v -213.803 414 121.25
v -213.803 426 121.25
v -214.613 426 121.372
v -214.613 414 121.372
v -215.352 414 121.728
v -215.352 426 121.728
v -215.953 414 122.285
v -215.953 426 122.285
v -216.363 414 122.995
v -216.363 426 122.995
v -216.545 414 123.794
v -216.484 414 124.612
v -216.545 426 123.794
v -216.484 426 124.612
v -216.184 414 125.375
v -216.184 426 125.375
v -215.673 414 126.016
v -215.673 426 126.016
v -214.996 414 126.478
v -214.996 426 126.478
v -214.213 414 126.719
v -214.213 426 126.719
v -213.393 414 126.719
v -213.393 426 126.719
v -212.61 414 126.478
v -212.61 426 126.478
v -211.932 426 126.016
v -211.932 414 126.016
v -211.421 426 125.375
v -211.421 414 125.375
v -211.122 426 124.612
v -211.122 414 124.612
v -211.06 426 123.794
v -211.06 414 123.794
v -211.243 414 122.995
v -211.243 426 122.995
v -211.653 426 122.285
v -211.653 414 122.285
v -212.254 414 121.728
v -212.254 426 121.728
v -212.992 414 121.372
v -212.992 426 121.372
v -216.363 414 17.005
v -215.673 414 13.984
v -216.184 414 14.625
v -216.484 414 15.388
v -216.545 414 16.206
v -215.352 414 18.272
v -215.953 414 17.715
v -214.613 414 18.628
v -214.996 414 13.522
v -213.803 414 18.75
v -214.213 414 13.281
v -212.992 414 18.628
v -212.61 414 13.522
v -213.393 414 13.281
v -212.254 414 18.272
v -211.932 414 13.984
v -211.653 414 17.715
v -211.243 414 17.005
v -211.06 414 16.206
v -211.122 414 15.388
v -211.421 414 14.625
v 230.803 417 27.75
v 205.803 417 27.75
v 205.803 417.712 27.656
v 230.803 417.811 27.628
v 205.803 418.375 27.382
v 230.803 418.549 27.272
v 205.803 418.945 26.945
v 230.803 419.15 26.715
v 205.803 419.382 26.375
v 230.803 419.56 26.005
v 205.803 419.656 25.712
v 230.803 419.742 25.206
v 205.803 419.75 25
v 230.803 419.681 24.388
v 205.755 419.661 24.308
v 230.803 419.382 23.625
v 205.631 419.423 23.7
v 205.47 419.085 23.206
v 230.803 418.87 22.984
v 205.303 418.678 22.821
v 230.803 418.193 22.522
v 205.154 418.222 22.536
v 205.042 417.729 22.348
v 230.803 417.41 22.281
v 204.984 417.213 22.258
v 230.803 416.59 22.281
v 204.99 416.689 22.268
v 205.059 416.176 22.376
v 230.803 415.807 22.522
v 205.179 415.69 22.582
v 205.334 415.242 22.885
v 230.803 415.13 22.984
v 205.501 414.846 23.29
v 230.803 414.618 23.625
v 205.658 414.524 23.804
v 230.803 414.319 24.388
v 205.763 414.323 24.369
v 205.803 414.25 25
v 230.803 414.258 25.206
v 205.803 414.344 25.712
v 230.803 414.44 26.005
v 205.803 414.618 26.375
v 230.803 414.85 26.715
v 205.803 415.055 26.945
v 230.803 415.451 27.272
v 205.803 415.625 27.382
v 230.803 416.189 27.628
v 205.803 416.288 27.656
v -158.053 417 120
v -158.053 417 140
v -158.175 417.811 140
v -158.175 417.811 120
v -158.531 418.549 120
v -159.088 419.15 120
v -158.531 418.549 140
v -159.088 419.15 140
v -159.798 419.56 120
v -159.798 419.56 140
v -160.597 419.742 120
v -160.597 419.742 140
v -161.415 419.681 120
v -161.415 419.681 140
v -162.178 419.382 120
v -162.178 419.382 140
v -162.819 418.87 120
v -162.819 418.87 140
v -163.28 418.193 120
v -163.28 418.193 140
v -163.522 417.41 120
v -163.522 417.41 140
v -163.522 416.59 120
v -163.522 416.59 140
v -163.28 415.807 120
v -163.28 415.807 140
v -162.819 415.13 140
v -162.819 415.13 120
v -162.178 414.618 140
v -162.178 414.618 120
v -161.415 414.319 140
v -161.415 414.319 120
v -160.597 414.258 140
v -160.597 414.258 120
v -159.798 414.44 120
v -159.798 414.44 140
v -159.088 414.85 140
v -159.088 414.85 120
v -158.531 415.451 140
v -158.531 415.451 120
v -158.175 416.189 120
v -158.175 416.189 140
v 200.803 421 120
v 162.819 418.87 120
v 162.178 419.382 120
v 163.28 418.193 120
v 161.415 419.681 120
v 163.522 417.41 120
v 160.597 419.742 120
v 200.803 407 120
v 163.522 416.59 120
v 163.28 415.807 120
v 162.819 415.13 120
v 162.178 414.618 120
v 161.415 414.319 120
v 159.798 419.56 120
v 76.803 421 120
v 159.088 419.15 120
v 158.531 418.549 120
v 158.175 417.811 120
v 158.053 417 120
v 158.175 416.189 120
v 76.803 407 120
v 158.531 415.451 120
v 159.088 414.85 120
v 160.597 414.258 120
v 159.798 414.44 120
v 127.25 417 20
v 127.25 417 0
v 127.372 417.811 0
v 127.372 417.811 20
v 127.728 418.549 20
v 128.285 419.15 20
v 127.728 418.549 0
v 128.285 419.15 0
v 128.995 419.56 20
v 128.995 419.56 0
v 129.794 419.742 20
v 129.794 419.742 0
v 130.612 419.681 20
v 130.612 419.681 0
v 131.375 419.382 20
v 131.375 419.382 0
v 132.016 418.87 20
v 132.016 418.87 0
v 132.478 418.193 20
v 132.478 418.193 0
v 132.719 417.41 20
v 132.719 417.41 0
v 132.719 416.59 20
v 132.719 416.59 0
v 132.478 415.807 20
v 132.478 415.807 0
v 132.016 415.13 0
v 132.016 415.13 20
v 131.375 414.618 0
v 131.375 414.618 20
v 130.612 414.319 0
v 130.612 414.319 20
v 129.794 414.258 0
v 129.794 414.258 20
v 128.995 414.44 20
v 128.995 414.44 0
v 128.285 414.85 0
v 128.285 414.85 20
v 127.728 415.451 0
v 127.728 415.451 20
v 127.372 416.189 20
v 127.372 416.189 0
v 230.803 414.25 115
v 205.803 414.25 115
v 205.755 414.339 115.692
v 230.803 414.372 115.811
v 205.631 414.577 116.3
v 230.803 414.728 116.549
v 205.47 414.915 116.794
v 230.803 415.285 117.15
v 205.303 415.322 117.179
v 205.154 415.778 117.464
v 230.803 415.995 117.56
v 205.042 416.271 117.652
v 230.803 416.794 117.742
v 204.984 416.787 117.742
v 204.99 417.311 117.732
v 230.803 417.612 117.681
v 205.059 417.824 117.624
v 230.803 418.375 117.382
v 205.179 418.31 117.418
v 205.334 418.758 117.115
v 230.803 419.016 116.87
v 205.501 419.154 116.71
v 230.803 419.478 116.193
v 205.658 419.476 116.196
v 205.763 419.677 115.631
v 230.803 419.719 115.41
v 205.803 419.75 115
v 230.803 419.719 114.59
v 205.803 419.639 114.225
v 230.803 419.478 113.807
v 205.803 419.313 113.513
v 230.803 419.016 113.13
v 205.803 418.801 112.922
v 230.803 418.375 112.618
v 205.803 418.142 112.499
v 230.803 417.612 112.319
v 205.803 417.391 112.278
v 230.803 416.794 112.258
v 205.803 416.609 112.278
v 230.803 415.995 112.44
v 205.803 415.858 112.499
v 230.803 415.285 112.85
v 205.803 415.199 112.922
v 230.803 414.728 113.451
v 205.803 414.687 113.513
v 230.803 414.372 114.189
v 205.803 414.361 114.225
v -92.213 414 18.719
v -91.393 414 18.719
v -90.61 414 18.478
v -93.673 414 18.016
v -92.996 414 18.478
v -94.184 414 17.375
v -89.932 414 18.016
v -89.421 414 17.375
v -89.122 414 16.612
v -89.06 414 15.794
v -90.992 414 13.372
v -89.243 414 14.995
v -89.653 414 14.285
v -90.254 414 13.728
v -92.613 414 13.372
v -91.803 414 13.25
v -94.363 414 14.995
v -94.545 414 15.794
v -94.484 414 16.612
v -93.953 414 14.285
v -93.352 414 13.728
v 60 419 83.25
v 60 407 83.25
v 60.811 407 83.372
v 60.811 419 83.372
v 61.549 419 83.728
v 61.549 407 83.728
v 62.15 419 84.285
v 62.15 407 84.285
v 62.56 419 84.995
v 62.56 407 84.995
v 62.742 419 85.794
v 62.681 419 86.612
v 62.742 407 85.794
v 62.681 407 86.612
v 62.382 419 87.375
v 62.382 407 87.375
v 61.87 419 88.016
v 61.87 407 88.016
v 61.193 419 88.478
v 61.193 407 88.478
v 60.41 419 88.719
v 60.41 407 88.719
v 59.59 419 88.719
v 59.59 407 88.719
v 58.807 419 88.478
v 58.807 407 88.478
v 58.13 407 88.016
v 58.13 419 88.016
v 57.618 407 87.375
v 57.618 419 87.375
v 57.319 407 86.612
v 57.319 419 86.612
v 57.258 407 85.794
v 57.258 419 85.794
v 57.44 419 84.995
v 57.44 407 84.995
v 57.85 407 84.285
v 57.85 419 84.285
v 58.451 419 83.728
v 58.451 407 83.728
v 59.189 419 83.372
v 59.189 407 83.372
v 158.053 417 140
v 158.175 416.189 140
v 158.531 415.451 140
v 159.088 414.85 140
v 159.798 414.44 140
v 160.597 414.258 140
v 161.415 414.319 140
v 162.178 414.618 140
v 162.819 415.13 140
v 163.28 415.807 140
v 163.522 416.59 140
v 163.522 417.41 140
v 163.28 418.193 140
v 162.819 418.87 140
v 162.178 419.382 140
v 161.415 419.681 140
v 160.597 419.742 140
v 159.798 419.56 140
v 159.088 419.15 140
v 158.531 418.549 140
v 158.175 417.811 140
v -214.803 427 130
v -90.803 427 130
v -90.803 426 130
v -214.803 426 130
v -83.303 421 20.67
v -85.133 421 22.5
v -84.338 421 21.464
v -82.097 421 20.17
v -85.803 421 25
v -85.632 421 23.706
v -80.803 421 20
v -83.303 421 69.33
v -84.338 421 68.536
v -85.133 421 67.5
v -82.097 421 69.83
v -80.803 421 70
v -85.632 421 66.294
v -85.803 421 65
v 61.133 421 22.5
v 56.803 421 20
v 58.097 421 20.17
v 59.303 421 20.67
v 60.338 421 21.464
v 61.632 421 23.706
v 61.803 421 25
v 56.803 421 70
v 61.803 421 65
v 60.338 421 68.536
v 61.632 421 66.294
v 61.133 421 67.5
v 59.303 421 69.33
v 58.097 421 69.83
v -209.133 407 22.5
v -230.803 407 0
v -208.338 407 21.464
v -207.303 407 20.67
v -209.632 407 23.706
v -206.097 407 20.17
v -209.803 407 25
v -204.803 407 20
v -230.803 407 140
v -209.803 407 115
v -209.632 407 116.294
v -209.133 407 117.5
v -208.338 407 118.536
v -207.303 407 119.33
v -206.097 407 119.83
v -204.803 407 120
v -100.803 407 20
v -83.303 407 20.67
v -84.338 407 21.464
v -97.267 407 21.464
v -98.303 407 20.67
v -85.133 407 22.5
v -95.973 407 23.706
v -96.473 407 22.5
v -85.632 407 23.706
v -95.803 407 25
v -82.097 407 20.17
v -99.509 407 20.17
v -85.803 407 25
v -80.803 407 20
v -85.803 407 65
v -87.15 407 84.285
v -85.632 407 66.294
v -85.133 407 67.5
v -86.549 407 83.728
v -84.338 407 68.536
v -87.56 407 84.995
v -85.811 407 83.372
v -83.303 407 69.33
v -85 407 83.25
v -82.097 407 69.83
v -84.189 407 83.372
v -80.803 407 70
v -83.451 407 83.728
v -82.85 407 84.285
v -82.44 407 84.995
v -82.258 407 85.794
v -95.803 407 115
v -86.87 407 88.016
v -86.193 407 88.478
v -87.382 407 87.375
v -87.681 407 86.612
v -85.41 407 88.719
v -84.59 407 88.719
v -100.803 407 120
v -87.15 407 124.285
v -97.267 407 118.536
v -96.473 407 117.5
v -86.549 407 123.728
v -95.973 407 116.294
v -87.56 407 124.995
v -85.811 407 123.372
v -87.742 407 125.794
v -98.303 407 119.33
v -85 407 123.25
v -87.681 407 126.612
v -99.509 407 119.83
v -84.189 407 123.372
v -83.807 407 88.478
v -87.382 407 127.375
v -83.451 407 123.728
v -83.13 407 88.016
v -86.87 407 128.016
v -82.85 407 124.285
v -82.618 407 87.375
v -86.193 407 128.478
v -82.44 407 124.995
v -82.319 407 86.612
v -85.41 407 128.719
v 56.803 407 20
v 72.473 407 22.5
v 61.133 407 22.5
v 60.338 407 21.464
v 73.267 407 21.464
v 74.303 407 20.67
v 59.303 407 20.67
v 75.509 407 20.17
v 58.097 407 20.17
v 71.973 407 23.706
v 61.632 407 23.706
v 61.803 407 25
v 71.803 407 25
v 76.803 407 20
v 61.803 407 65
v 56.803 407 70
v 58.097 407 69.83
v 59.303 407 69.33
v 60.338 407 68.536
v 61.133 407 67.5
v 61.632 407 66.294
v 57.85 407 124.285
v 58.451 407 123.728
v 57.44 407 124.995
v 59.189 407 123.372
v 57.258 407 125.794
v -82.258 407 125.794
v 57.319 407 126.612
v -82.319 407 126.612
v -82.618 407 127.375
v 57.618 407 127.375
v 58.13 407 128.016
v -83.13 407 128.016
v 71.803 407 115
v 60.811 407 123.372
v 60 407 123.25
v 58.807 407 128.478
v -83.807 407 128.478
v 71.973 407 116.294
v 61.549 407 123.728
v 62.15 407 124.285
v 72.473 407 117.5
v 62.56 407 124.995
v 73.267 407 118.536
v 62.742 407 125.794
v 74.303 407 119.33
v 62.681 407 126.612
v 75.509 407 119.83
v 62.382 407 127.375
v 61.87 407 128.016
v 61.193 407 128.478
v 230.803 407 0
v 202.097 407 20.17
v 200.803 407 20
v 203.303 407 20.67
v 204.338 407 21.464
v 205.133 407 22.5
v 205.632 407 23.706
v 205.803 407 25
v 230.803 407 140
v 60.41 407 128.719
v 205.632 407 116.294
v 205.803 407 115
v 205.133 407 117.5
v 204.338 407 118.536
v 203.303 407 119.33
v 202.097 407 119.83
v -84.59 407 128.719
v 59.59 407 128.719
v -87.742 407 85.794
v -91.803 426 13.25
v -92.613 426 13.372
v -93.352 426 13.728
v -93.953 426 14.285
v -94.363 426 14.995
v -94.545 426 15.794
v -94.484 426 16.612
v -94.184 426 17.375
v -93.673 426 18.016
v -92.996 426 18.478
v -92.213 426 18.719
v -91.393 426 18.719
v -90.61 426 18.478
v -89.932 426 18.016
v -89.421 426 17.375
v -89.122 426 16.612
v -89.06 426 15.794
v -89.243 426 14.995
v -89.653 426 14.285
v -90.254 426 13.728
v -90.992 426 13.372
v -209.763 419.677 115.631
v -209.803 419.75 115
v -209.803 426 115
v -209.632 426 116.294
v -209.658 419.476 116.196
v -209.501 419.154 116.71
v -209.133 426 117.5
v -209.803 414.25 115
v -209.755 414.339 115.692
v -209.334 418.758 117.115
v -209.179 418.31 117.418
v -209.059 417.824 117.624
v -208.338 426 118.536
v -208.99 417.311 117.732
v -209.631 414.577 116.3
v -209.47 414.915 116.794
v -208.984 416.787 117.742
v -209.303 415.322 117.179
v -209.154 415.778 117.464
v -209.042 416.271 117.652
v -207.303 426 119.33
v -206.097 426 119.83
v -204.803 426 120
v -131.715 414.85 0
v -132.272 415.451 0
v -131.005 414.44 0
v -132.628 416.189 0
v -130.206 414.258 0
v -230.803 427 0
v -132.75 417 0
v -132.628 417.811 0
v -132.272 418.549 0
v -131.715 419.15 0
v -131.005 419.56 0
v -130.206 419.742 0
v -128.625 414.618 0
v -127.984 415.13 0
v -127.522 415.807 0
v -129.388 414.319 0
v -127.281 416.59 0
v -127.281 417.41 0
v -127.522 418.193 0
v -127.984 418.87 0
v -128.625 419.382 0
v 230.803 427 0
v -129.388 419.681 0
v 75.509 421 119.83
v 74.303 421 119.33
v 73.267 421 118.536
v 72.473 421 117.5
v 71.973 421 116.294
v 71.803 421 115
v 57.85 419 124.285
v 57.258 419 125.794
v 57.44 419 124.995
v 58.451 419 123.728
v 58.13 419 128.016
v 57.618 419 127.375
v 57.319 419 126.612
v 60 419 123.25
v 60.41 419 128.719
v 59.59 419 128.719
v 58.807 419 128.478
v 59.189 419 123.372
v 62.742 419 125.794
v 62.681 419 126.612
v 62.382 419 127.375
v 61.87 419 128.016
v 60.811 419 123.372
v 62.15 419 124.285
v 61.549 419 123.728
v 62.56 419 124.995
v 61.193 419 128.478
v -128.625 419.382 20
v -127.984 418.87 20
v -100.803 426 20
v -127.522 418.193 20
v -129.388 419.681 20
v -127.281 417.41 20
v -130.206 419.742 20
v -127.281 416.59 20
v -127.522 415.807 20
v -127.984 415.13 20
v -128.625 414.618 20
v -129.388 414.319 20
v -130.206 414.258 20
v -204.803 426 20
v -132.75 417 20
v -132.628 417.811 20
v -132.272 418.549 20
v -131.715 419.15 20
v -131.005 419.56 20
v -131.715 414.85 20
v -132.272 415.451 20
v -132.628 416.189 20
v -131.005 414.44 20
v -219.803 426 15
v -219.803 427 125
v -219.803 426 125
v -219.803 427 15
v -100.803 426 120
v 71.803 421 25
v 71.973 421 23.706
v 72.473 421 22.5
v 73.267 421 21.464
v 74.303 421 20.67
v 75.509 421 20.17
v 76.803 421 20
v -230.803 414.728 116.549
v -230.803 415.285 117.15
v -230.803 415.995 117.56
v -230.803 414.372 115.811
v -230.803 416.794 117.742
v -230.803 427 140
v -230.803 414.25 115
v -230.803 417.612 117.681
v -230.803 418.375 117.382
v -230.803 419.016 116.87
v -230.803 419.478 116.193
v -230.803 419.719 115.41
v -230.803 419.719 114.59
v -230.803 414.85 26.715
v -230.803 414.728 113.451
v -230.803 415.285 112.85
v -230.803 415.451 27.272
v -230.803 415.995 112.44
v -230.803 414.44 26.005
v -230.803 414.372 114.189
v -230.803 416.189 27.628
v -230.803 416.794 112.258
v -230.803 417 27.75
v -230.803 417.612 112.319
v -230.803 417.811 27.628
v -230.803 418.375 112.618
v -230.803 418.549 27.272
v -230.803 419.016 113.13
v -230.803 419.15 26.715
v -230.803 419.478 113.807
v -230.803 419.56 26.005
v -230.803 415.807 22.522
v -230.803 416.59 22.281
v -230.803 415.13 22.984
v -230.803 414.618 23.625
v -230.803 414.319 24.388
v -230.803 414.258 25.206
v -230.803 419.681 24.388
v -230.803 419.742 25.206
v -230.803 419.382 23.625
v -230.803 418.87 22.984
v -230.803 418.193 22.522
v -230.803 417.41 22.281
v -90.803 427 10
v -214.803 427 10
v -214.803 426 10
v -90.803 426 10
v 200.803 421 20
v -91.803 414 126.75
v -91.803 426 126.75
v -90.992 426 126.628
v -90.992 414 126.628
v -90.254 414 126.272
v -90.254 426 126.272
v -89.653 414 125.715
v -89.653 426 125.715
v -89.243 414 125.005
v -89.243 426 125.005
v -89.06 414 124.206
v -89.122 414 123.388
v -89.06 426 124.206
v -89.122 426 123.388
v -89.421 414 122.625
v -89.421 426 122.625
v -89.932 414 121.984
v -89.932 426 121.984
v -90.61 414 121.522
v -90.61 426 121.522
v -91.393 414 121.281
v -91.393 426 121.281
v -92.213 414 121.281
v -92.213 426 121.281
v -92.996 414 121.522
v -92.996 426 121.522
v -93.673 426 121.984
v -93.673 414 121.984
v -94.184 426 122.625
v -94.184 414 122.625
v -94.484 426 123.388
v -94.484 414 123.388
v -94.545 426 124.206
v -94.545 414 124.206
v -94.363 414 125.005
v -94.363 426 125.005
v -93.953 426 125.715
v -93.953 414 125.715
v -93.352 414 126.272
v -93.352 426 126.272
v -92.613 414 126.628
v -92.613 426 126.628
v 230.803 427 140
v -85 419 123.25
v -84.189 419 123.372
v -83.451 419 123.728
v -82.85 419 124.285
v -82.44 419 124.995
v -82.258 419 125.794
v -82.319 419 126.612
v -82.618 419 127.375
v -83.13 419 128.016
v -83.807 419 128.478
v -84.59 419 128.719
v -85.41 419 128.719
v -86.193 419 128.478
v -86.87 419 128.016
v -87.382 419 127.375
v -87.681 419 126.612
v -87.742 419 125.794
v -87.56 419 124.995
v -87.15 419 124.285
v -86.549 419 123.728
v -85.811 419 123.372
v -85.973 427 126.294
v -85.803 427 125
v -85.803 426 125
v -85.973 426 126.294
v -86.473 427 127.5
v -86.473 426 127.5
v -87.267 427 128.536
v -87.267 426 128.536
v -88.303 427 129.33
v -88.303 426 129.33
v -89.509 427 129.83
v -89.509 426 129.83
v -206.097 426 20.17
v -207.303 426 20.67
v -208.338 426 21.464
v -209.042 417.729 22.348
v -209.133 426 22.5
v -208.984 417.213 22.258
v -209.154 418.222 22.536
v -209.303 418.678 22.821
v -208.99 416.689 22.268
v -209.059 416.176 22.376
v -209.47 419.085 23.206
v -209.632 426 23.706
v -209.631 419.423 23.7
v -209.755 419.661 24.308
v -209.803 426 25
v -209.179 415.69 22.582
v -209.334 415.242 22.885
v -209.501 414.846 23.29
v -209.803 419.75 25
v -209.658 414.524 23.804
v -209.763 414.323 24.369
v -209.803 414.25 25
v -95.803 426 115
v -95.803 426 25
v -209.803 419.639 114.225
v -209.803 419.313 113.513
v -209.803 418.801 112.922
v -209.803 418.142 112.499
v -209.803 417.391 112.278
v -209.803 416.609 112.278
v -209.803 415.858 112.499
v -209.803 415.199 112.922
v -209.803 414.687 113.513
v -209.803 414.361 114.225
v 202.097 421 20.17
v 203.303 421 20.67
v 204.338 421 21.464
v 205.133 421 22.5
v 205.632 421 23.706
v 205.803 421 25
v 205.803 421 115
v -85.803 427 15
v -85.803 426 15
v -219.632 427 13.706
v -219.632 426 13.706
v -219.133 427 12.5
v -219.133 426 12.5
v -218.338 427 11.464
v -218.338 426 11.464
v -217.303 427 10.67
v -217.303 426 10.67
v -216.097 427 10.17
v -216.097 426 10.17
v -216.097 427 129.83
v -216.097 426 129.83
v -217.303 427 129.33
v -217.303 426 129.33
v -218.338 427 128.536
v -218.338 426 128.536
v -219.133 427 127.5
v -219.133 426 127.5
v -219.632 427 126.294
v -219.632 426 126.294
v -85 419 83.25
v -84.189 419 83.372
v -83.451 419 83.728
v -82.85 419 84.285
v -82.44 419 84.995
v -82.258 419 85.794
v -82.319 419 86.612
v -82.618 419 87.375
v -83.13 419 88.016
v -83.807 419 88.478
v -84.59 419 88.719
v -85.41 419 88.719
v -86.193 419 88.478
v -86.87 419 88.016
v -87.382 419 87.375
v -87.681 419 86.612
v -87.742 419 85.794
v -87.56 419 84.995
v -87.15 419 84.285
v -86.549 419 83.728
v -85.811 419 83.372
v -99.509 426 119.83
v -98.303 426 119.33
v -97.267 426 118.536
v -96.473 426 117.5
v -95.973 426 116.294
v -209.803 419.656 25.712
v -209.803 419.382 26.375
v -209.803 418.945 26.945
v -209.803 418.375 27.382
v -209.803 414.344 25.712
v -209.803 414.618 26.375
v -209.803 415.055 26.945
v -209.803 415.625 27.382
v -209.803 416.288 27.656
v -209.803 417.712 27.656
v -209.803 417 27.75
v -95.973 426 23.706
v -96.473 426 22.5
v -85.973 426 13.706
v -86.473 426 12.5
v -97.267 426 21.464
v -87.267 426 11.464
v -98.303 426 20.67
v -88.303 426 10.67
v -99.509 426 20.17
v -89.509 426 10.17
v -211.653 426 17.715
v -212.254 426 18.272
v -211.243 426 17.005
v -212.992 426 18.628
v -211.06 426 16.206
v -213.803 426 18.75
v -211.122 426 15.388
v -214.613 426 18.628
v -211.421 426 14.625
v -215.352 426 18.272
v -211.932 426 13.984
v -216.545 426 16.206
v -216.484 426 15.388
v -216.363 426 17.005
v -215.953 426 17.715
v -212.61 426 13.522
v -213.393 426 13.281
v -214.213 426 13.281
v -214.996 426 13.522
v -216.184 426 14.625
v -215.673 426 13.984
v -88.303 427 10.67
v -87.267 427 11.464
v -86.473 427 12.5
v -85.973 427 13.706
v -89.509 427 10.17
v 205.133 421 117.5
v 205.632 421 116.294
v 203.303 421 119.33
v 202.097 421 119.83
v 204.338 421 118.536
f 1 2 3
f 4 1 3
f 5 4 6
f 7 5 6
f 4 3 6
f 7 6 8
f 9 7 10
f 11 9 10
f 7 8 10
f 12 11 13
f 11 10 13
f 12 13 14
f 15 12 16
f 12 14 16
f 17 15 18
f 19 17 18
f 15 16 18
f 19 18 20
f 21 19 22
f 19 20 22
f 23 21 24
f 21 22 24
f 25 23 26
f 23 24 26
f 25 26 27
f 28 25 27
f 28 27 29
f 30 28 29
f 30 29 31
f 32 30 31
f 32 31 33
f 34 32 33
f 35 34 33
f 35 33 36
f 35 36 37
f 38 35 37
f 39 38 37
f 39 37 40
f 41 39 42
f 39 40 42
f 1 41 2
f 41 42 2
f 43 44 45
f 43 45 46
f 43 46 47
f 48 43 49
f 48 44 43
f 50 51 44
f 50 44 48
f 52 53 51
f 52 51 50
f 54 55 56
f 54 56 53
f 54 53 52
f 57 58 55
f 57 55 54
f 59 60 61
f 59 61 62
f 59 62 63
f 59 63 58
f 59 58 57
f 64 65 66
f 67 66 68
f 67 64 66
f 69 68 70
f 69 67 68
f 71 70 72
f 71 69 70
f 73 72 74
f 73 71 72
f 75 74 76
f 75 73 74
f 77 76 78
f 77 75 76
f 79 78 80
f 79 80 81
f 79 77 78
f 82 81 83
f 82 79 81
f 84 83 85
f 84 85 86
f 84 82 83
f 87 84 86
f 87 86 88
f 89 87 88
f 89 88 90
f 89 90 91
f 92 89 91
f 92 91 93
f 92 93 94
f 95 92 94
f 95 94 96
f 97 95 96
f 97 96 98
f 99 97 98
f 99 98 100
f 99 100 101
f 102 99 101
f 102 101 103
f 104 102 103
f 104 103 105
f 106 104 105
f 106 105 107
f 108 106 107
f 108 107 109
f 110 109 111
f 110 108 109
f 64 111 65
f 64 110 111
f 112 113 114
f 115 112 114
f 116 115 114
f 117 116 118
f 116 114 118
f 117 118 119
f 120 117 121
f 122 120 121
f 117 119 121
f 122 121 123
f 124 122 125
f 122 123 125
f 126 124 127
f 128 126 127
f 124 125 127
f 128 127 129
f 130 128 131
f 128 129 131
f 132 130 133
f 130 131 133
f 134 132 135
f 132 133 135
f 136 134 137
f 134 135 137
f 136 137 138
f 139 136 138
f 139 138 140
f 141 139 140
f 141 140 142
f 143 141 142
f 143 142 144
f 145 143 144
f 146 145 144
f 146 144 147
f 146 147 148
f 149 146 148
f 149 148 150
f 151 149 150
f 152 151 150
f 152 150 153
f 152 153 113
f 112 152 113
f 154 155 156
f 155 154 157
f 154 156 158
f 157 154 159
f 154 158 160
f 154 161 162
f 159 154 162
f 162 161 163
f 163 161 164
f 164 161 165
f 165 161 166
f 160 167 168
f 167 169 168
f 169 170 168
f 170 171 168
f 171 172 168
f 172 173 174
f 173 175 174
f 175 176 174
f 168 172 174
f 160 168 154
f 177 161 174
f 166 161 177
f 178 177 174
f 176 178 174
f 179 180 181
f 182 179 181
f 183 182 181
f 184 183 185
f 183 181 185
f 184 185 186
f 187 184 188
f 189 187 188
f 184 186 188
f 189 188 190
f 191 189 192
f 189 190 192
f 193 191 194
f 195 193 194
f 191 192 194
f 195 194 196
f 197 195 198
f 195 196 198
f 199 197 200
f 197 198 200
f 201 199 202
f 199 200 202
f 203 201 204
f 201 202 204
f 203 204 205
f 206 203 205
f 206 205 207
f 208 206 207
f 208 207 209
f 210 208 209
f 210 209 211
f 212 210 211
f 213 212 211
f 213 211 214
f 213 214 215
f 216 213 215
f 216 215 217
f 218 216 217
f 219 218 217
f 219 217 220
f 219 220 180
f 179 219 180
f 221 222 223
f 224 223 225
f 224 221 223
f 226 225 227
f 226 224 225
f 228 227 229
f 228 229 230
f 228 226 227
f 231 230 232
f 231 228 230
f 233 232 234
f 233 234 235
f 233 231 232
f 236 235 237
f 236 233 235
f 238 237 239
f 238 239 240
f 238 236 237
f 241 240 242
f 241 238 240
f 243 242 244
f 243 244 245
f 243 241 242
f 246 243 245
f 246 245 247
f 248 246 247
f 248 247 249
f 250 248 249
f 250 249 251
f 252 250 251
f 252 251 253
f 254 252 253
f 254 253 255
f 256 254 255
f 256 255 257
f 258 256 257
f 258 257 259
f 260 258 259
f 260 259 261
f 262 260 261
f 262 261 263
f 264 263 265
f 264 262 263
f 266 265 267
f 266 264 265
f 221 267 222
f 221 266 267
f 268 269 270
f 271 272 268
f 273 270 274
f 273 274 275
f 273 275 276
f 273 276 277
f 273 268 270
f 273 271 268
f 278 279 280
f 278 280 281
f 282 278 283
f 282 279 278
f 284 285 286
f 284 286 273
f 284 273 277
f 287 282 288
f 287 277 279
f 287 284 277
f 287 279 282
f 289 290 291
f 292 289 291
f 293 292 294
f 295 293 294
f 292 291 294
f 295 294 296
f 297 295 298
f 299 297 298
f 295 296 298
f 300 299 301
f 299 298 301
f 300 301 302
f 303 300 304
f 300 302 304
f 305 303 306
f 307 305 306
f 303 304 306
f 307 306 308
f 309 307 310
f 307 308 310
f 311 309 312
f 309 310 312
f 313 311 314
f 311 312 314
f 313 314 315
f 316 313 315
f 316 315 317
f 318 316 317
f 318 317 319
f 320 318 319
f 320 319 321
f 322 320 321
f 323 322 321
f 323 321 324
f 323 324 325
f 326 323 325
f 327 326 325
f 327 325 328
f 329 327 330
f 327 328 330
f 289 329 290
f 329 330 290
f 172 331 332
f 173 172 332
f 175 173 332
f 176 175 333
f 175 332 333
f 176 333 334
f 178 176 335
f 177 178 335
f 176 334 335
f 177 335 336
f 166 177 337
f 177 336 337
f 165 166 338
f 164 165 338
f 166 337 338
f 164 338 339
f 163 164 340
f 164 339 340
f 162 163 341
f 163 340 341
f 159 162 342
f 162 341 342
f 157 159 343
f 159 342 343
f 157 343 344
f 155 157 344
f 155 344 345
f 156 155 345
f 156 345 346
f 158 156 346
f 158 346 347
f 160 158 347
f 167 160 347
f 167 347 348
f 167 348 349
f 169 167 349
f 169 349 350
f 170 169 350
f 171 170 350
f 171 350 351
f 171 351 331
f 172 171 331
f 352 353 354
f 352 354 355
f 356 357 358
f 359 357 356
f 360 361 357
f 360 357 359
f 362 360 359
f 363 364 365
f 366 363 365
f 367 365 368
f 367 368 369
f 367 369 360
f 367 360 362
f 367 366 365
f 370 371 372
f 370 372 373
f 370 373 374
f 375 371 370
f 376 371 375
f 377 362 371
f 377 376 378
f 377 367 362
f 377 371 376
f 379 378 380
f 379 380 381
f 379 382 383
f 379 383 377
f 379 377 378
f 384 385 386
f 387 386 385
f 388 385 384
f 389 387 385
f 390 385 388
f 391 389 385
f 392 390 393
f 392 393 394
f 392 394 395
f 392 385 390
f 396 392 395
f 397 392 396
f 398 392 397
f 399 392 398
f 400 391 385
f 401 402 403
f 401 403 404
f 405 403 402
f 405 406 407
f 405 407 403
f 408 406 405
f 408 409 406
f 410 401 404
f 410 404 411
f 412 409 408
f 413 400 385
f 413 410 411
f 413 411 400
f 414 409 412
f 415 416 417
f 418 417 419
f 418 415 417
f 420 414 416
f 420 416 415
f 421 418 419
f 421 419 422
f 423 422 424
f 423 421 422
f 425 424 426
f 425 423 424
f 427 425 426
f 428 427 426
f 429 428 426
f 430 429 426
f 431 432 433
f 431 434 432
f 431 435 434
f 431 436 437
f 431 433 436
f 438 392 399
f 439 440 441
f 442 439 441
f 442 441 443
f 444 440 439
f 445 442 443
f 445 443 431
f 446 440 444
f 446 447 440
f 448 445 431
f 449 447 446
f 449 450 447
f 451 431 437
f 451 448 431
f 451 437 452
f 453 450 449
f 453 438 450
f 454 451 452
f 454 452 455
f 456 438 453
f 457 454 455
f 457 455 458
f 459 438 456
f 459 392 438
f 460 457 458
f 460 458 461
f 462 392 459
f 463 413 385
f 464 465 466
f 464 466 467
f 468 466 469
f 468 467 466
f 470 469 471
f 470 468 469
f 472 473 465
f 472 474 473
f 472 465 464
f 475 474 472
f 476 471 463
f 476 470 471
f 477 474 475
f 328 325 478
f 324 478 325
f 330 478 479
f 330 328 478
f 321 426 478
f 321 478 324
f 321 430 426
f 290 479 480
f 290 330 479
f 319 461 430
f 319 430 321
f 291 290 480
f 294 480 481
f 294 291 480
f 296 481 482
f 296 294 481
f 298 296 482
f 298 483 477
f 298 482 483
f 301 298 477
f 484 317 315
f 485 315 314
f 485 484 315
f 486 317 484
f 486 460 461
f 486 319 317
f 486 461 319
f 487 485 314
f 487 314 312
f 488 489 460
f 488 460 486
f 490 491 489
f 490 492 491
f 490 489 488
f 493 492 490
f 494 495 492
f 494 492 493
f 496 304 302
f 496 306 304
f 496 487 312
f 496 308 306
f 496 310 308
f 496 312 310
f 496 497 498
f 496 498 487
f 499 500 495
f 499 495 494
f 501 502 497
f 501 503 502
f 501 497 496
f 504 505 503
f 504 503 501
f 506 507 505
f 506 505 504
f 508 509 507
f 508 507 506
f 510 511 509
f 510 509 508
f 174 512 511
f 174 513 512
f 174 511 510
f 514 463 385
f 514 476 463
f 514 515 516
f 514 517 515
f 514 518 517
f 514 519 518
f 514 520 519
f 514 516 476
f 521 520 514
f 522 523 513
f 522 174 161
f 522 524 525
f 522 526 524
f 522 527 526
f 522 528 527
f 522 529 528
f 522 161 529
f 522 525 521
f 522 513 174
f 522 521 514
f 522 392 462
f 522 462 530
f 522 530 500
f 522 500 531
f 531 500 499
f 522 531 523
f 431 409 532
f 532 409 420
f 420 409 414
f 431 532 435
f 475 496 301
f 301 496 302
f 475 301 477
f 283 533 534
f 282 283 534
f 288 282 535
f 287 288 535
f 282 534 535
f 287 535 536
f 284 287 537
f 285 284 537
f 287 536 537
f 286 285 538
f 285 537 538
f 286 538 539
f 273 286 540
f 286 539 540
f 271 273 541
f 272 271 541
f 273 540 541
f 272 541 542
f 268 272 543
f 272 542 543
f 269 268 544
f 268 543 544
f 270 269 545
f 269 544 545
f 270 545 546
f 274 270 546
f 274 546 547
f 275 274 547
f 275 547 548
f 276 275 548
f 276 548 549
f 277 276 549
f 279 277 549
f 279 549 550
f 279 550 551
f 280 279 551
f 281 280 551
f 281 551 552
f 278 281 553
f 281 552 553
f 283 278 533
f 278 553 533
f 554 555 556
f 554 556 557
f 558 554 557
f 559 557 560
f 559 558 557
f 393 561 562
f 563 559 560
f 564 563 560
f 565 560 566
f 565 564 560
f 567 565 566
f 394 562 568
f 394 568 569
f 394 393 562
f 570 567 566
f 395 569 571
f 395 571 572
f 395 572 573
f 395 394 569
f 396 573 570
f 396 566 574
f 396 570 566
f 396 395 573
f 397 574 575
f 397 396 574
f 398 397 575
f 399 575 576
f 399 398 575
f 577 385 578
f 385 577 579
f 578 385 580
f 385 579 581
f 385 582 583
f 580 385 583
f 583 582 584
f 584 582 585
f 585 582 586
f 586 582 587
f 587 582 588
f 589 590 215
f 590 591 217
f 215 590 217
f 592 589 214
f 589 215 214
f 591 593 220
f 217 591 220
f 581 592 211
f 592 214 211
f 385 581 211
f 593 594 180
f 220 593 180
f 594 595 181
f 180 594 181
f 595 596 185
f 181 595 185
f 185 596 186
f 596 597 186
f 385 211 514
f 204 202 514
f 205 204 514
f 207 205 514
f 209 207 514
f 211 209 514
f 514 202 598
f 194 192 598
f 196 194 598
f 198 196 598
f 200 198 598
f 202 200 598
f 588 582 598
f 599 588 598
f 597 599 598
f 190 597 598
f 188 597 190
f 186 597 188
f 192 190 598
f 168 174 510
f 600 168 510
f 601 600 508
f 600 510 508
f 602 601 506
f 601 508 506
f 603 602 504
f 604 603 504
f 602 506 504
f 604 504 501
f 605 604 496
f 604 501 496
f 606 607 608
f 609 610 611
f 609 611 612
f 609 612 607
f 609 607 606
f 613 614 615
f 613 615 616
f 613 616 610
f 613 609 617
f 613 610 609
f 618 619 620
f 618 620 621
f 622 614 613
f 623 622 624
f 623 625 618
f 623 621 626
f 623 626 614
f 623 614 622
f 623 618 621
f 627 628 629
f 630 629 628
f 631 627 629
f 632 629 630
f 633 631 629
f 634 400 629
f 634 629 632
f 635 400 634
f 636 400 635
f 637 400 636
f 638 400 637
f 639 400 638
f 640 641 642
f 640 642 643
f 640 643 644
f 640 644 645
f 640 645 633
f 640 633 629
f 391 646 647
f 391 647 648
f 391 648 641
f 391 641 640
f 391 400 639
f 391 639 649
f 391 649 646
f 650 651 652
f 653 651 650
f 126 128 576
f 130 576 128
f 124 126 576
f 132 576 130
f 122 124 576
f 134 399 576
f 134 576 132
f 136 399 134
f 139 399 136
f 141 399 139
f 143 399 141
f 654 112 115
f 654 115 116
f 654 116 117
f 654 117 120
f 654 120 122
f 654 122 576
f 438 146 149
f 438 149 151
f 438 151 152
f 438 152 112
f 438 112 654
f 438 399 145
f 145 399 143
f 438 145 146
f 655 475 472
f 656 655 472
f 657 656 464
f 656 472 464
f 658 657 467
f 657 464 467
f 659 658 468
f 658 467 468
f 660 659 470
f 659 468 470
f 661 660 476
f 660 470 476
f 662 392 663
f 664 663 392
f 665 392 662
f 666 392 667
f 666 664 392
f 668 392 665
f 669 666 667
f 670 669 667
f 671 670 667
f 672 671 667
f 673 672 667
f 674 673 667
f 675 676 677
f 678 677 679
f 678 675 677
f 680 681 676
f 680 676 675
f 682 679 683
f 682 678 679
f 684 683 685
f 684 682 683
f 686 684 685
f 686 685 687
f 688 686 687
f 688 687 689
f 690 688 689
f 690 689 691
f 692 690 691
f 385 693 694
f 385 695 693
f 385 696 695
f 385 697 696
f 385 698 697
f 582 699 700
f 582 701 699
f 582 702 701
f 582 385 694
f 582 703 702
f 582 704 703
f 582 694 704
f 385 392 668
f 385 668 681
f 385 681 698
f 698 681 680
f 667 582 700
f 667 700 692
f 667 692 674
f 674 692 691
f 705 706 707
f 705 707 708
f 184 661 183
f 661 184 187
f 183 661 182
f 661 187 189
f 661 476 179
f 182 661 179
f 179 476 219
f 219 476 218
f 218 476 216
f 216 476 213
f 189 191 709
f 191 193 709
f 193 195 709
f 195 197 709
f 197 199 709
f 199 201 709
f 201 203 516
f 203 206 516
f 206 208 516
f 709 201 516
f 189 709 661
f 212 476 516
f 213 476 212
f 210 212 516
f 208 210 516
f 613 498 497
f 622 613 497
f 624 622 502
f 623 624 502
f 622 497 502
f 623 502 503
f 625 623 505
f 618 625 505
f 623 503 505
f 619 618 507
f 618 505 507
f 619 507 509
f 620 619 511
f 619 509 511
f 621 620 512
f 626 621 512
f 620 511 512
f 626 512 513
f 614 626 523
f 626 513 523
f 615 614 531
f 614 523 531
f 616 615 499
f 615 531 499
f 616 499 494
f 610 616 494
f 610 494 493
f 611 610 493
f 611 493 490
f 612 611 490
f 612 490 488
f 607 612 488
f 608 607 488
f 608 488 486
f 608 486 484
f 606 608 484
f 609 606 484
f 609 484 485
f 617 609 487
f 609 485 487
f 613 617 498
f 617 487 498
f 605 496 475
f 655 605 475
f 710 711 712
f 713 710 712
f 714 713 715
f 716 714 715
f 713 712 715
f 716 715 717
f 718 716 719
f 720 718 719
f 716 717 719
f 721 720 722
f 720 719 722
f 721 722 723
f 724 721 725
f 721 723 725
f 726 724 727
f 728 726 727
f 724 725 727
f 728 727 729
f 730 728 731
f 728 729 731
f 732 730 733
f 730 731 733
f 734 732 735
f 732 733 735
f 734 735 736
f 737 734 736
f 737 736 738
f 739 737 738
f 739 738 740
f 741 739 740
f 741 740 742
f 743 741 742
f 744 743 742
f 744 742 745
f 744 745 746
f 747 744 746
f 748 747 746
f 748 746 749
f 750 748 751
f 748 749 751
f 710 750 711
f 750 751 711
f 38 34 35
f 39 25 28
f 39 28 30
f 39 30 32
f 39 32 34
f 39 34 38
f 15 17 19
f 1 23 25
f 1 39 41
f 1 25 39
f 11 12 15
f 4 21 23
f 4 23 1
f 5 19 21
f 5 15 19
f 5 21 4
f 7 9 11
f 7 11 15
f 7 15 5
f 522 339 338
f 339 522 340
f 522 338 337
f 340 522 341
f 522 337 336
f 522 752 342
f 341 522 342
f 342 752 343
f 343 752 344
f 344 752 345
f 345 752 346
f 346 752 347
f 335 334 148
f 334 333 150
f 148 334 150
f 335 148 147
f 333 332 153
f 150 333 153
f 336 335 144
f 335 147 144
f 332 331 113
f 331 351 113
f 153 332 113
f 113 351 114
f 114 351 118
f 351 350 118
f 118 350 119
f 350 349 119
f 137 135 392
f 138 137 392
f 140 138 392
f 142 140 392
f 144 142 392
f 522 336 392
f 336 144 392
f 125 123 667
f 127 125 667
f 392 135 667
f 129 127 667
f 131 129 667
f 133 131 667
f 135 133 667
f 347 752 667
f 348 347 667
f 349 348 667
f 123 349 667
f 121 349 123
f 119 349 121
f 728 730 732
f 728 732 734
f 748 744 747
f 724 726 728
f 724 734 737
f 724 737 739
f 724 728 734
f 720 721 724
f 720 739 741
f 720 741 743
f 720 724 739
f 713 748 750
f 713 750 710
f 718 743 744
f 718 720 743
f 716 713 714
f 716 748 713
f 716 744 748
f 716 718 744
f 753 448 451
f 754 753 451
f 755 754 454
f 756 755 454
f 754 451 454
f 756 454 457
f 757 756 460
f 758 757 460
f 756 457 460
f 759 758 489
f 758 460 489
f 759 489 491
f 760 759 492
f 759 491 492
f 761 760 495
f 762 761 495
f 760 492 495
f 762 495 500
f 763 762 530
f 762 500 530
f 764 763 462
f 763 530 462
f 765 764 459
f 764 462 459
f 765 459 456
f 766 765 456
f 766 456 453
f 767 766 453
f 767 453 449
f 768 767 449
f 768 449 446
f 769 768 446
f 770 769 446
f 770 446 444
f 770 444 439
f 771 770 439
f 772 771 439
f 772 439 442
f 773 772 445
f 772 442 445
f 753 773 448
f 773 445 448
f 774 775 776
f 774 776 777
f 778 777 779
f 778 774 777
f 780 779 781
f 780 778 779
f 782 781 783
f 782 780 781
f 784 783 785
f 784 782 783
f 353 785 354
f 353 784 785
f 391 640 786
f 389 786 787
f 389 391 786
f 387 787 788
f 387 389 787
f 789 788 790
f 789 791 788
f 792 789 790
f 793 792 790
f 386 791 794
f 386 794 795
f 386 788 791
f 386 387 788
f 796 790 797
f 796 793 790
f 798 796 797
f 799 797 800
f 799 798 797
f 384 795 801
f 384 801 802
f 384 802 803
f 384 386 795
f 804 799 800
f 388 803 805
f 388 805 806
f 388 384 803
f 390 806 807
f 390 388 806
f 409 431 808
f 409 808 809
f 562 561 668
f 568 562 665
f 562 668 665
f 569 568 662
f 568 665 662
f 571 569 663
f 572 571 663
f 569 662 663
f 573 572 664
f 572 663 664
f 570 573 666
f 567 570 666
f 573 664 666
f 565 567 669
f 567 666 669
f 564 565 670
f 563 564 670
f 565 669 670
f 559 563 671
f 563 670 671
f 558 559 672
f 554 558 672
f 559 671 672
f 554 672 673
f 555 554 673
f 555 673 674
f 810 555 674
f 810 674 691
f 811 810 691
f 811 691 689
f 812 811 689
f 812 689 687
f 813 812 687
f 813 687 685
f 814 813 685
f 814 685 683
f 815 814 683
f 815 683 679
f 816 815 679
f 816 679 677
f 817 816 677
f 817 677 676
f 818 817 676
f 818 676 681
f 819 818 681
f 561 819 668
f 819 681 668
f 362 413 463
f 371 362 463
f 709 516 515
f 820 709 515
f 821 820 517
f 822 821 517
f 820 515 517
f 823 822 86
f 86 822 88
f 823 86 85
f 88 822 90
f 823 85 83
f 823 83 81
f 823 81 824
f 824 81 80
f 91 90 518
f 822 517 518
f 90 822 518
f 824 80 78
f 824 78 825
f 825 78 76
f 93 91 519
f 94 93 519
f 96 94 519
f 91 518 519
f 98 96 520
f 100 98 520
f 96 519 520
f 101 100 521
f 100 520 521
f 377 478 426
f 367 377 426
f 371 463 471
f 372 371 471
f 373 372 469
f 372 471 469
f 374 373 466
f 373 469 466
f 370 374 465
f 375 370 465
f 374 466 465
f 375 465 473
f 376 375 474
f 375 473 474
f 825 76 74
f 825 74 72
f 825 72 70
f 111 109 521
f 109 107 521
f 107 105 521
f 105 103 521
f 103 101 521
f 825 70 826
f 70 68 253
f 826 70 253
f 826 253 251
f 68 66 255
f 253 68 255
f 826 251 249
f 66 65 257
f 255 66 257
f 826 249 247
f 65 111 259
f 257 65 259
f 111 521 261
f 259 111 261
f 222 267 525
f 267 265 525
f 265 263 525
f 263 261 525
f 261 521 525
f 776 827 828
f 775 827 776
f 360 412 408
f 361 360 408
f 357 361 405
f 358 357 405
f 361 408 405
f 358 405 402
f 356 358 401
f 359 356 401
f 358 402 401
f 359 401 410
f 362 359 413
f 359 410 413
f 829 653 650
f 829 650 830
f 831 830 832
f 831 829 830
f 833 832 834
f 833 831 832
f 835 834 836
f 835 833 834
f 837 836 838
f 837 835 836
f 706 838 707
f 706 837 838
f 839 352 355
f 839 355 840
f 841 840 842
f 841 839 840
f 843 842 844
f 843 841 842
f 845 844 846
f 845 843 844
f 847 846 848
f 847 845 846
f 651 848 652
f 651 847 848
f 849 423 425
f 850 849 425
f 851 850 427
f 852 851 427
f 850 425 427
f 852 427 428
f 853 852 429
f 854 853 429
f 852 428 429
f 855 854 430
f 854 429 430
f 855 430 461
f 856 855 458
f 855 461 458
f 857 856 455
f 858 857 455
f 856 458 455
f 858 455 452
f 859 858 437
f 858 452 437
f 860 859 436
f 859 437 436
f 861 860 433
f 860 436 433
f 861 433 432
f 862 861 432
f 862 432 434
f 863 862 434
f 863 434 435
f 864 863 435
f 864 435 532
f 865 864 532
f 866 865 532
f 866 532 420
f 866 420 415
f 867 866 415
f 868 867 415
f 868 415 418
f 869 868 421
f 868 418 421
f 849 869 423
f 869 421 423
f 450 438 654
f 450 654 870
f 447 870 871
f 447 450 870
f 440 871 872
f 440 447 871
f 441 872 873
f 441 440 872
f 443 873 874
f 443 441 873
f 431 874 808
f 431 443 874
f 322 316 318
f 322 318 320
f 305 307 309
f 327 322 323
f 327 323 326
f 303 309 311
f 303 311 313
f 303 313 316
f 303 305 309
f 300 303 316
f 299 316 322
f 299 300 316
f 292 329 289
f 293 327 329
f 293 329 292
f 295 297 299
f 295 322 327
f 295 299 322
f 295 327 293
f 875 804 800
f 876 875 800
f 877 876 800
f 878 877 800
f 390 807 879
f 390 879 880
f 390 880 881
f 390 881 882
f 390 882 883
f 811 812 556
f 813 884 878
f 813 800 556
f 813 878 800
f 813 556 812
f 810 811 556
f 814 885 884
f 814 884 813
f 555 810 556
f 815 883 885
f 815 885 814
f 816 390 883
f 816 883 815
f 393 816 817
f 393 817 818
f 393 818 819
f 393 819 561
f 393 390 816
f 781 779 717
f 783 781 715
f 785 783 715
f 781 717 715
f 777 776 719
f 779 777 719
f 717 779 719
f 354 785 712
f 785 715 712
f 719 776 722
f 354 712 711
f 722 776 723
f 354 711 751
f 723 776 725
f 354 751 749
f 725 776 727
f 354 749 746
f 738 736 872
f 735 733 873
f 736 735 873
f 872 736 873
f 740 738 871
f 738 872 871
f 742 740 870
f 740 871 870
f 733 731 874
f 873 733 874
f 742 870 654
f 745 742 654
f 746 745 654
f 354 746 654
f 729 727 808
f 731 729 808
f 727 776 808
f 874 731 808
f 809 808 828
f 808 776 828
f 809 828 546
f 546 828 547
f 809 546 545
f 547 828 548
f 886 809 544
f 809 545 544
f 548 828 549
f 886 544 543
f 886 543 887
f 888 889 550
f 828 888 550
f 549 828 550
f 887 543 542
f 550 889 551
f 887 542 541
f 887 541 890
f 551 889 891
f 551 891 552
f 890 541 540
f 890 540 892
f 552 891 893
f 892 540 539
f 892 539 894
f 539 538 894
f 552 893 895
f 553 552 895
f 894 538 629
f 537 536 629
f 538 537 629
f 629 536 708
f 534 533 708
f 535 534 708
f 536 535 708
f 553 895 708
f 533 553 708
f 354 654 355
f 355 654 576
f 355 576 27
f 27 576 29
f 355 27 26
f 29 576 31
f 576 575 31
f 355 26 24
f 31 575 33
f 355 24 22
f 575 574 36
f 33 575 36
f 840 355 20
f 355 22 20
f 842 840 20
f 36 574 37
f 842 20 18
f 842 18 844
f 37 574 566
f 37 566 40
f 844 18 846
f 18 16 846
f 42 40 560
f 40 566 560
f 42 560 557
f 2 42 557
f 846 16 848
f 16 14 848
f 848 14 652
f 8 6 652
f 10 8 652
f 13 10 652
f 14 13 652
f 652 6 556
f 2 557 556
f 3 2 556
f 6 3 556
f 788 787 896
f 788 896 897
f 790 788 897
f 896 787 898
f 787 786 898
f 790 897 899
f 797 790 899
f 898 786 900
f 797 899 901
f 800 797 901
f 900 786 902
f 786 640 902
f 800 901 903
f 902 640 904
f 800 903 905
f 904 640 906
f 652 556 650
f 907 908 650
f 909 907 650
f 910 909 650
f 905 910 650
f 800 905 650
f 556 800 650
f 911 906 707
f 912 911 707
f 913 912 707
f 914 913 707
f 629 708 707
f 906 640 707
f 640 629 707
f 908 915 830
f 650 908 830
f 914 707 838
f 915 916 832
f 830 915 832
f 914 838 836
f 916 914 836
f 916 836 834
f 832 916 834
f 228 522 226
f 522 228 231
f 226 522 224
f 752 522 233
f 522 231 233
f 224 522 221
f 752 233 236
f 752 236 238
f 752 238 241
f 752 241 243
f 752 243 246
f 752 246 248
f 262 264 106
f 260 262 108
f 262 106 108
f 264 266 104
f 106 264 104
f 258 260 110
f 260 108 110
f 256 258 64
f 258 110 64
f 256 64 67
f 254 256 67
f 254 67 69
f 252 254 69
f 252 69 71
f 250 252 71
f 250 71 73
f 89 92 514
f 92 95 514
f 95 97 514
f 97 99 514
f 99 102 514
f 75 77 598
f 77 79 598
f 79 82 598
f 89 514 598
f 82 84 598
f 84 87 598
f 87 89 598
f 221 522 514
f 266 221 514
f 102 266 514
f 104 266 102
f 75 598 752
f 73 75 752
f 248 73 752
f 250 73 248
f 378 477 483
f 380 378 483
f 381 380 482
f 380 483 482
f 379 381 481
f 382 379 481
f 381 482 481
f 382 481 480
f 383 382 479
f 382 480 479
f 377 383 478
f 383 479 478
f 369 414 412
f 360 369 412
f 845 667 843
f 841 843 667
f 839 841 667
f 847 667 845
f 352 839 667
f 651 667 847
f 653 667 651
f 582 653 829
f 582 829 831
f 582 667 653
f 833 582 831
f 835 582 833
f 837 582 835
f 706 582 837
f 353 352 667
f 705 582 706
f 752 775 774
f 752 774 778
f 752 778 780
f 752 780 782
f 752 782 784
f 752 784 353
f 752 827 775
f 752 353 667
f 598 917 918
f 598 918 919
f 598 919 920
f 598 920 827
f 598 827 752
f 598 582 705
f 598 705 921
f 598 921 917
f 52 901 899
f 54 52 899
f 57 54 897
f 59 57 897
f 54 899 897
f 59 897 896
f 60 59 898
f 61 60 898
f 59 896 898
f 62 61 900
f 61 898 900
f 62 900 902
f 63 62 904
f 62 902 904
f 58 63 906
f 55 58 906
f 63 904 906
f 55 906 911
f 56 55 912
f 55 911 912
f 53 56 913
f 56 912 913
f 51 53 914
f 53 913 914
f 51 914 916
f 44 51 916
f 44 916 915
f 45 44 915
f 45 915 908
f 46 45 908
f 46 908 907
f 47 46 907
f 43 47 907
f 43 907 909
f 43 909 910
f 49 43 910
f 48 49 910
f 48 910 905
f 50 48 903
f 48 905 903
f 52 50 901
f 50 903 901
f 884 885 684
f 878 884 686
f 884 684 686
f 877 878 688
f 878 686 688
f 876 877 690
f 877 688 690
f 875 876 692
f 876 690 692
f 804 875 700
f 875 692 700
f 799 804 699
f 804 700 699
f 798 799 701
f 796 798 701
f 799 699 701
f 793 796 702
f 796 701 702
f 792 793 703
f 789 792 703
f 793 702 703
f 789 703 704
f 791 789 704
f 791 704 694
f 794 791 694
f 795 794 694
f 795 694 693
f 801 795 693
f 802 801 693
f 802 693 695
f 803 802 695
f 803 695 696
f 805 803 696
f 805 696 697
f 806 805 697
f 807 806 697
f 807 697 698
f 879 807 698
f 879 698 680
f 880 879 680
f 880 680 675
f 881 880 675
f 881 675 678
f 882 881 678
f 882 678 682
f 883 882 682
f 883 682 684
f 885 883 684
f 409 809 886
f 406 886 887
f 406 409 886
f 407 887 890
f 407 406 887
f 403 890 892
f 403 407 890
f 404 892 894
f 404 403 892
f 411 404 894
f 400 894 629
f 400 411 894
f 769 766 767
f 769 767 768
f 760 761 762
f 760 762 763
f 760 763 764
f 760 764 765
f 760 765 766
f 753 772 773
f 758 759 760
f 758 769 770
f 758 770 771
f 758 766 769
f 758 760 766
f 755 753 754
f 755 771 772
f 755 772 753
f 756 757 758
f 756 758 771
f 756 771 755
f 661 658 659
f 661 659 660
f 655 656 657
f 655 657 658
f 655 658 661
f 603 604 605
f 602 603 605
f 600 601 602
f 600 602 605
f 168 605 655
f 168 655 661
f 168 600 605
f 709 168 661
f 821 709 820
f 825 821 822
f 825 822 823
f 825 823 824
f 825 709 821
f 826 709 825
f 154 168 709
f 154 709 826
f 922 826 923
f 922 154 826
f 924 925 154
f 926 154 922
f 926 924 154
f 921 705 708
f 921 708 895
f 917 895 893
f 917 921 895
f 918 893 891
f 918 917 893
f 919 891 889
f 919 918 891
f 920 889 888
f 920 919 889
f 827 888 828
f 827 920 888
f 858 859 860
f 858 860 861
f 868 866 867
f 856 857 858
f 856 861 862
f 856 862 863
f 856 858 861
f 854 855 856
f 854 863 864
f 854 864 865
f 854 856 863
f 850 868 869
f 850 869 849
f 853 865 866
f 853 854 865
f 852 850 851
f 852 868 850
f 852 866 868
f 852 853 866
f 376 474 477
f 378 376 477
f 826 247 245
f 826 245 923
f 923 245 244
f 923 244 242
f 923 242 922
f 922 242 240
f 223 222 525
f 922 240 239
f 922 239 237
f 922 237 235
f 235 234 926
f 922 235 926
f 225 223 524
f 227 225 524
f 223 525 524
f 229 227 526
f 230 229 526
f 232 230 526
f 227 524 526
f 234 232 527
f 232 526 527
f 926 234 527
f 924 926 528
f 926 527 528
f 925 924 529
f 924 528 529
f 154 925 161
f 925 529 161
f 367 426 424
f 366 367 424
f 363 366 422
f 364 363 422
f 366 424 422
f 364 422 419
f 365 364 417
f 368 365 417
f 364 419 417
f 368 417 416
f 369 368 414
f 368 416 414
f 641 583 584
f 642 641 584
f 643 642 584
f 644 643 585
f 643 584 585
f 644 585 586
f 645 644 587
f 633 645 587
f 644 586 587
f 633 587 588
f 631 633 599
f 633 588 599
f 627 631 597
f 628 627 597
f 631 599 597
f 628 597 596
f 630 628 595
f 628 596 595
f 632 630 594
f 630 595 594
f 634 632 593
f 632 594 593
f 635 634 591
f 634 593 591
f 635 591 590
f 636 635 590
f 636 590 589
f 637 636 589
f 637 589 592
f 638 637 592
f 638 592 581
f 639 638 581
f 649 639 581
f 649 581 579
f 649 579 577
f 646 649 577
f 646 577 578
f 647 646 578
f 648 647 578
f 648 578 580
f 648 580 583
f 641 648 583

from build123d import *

# Parameters (mm, degrees)
SKETCH1_W           = 461.60558249
SKETCH1_H           = 20
BOSS_EXTRUDE1_DEPTH = 140
SKETCH2_W           = 150
SKETCH2_H           = 12
CUT_EXTRUDE1_DEPTH  = 80
CUT_EXTRUDE2_DEPTH  = 271.684185808
CUT_EXTRUDE3_DEPTH  = 1
SKETCH5_R           = 2.75
CUT_EXTRUDE4_DEPTH  = 12
FILLET1_R           = 5
SKETCH7_R           = 2.75
CUT_EXTRUDE6_DEPTH  = 30
SKETCH8_R           = 2.75
CUT_EXTRUDE7_DEPTH  = 30
BOSS_EXTRUDE2_DEPTH = 12
SKETCH10_R          = 2.75
CUT_EXTRUDE8_DEPTH  = 12
CUT_EXTRUDE5_DEPTH  = 14
SKETCH11_R          = 2.75
CUT_EXTRUDE9_DEPTH  = 30


with BuildPart() as part:
    # Sketch1 → Boss-Extrude1 (new body)
    with BuildSketch(Plane.XY):
        with Locations((0, 417)):
            Rectangle(SKETCH1_W, SKETCH1_H)
    extrude(amount=BOSS_EXTRUDE1_DEPTH)

    # Sketch2 → Cut-Extrude1 (cut)
    with BuildSketch(Plane.XY.offset(140)):
        with Locations((19.197208755, 413)):
            Rectangle(SKETCH2_W, SKETCH2_H)
    extrude(amount=-CUT_EXTRUDE1_DEPTH, mode=Mode.SUBTRACT)

    # Sketch3 → Cut-Extrude2 (cut, through all)
    with BuildSketch(Plane.XZ.offset(-407)):
        with BuildLine():
            Line((-100.802791245, 20), (-204.802791245, 20))
            ThreePointArc((-204.802791245, 20), (-208.338325151, 21.464466094), (-209.802791245, 25))
            Line((-209.802791245, 25), (-209.802791245, 115))
            ThreePointArc((-209.802791245, 115), (-208.338325151, 118.535533906), (-204.802791245, 120))
            Line((-204.802791245, 120), (-100.802791245, 120))
            ThreePointArc((-100.802791245, 120), (-97.267257339, 118.535533906), (-95.802791245, 115))
            Line((-95.802791245, 115), (-95.802791245, 25))
            ThreePointArc((-95.802791245, 25), (-97.267257339, 21.464466094), (-100.802791245, 20))
        make_face()
    extrude(amount=-CUT_EXTRUDE2_DEPTH, mode=Mode.SUBTRACT)

    # Sketch4 → Cut-Extrude3 (cut)
    with BuildSketch(Plane(origin=(0, 427, 0), x_dir=(1, 0, 0), z_dir=(0, 1, 0))):
        with BuildLine():
            Line((-90.802791245, -130), (-214.802791245, -130))
            ThreePointArc((-214.802791245, -130), (-218.338325151, -128.535533906), (-219.802791245, -125))
            Line((-219.802791245, -125), (-219.802791245, -15))
            ThreePointArc((-219.802791245, -15), (-218.338325151, -11.464466094), (-214.802791245, -10))
            Line((-214.802791245, -10), (-90.802791245, -10))
            ThreePointArc((-90.802791245, -10), (-87.267257339, -11.464466094), (-85.802791245, -15))
            Line((-85.802791245, -15), (-85.802791245, -125))
            ThreePointArc((-85.802791245, -125), (-87.267257339, -128.535533906), (-90.802791245, -130))
        make_face()
    extrude(amount=-CUT_EXTRUDE3_DEPTH, mode=Mode.SUBTRACT)

    # Sketch5 → Cut-Extrude4 (cut)
    with BuildSketch(Plane(origin=(0, 426, 0), x_dir=(1, 0, 0), z_dir=(0, 1, 0))):
        with Locations(Location((-91.802791245, -124, 0), (0, 0, 270))):
            Circle(SKETCH5_R)
        with Locations(Location((-213.802791245, -124, 0), (0, 0, 90))):
            Circle(SKETCH5_R)
        with Locations(Location((-213.802791245, -16, 0), (0, 0, 270))):
            Circle(SKETCH5_R)
        with Locations(Location((-91.802791245, -16, 0), (0, 0, 90))):
            Circle(SKETCH5_R)
    extrude(amount=-CUT_EXTRUDE4_DEPTH, mode=Mode.SUBTRACT)

    # Fillet1
    fillet1_edges = [part.edges().sort_by_distance(p)[0] for p in [
        (94.197208755, 413, 60),
        (-55.802791245, 413, 60),
    ]]
    fillet(fillet1_edges, radius=FILLET1_R)

    # Sketch7 → Cut-Extrude6 (cut)
    with BuildSketch(Plane.ZY.offset(230.802791245)):
        with Locations((25, 417)):
            Circle(SKETCH7_R)
        with Locations(Location((115, 417, 0), (0, 0, 270))):
            Circle(SKETCH7_R)
    cut_extrude6 = extrude(amount=-CUT_EXTRUDE6_DEPTH, mode=Mode.SUBTRACT)

    # Mirror1: Cut-Extrude6 across plane
    add(cut_extrude6.mirror(Plane(origin=(0, 0, 0), x_dir=(0, 0, 1), z_dir=(1, 0, 0))), mode=Mode.SUBTRACT)

    # Sketch8 → Cut-Extrude7 (cut)
    with BuildSketch(Plane.XY.offset(140)):
        with Locations((-160.802791245, 417)):
            Circle(SKETCH8_R)
        with Locations(Location((160.802791245, 417, 0), (0, 0, 180))):
            Circle(SKETCH8_R)
    extrude(amount=-CUT_EXTRUDE7_DEPTH, mode=Mode.SUBTRACT)

    # Sketch9 → Boss-Extrude2 (add)
    with BuildSketch(Plane.XZ.offset(-419)):
        with BuildLine():
            Line((94.197208755, 65), (94.197208755, 140))
            Line((94.197208755, 140), (-55.802791245, 140))
            Line((-55.802791245, 140), (-55.802791245, 65))
            ThreePointArc((-55.802791245, 65), (-54.338325151, 61.464466094), (-50.802791245, 60))
            Line((-50.802791245, 60), (89.197208755, 60))
            ThreePointArc((89.197208755, 60), (92.732742661, 61.464466094), (94.197208755, 65))
        make_face()
    extrude(amount=BOSS_EXTRUDE2_DEPTH)

    # Sketch10 → Cut-Extrude8 (cut)
    with BuildSketch(Plane.XZ.offset(-407)):
        with Locations(Location((-85, 126, 0), (0, 0, 270))):
            Circle(SKETCH10_R)
        with Locations(Location((-85, 86, 0), (0, 0, 270))):
            Circle(SKETCH10_R)
        with Locations(Location((60, 126, 0), (0, 0, 270))):
            Circle(SKETCH10_R)
        with Locations(Location((60, 86, 0), (0, 0, 270))):
            Circle(SKETCH10_R)
    extrude(amount=-CUT_EXTRUDE8_DEPTH, mode=Mode.SUBTRACT)

    # Sketch6 → Cut-Extrude5 (cut)
    with BuildSketch(Plane.XZ.offset(-407)):
        with BuildLine():
            Line((200.802791245, 120), (76.802791245, 120))
            ThreePointArc((76.802791245, 120), (73.267257339, 118.535533906), (71.802791245, 115))
            Line((71.802791245, 115), (71.802791245, 25))
            ThreePointArc((71.802791245, 25), (73.267257339, 21.464466094), (76.802791245, 20))
            Line((76.802791245, 20), (200.802791245, 20))
            ThreePointArc((200.802791245, 20), (204.338325151, 21.464466094), (205.802791245, 25))
            Line((205.802791245, 25), (205.802791245, 115))
            ThreePointArc((205.802791245, 115), (204.338325151, 118.535533906), (200.802791245, 120))
        make_face()
        with BuildLine():
            Line((56.802791245, 70), (-80.802791245, 70))
            ThreePointArc((-80.802791245, 70), (-84.338325151, 68.535533906), (-85.802791245, 65))
            Line((-85.802791245, 65), (-85.802791245, 25))
            ThreePointArc((-85.802791245, 25), (-84.338325151, 21.464466094), (-80.802791245, 20))
            Line((-80.802791245, 20), (56.802791245, 20))
            ThreePointArc((56.802791245, 20), (60.338325151, 21.464466094), (61.802791245, 25))
            Line((61.802791245, 25), (61.802791245, 65))
            ThreePointArc((61.802791245, 65), (60.338325151, 68.535533906), (56.802791245, 70))
        make_face()
    extrude(amount=-CUT_EXTRUDE5_DEPTH, mode=Mode.SUBTRACT)

    # Sketch11 → Cut-Extrude9 (cut)
    with BuildSketch(Plane(origin=(0, 0, 0), x_dir=(-1, 0, 0), z_dir=(0, 0, -1))):
        with Locations((130, 417)):
            Circle(SKETCH11_R)
        with Locations((-130, 417)):
            Circle(SKETCH11_R)
    extrude(amount=-CUT_EXTRUDE9_DEPTH, mode=Mode.SUBTRACT)


solid = part.part
